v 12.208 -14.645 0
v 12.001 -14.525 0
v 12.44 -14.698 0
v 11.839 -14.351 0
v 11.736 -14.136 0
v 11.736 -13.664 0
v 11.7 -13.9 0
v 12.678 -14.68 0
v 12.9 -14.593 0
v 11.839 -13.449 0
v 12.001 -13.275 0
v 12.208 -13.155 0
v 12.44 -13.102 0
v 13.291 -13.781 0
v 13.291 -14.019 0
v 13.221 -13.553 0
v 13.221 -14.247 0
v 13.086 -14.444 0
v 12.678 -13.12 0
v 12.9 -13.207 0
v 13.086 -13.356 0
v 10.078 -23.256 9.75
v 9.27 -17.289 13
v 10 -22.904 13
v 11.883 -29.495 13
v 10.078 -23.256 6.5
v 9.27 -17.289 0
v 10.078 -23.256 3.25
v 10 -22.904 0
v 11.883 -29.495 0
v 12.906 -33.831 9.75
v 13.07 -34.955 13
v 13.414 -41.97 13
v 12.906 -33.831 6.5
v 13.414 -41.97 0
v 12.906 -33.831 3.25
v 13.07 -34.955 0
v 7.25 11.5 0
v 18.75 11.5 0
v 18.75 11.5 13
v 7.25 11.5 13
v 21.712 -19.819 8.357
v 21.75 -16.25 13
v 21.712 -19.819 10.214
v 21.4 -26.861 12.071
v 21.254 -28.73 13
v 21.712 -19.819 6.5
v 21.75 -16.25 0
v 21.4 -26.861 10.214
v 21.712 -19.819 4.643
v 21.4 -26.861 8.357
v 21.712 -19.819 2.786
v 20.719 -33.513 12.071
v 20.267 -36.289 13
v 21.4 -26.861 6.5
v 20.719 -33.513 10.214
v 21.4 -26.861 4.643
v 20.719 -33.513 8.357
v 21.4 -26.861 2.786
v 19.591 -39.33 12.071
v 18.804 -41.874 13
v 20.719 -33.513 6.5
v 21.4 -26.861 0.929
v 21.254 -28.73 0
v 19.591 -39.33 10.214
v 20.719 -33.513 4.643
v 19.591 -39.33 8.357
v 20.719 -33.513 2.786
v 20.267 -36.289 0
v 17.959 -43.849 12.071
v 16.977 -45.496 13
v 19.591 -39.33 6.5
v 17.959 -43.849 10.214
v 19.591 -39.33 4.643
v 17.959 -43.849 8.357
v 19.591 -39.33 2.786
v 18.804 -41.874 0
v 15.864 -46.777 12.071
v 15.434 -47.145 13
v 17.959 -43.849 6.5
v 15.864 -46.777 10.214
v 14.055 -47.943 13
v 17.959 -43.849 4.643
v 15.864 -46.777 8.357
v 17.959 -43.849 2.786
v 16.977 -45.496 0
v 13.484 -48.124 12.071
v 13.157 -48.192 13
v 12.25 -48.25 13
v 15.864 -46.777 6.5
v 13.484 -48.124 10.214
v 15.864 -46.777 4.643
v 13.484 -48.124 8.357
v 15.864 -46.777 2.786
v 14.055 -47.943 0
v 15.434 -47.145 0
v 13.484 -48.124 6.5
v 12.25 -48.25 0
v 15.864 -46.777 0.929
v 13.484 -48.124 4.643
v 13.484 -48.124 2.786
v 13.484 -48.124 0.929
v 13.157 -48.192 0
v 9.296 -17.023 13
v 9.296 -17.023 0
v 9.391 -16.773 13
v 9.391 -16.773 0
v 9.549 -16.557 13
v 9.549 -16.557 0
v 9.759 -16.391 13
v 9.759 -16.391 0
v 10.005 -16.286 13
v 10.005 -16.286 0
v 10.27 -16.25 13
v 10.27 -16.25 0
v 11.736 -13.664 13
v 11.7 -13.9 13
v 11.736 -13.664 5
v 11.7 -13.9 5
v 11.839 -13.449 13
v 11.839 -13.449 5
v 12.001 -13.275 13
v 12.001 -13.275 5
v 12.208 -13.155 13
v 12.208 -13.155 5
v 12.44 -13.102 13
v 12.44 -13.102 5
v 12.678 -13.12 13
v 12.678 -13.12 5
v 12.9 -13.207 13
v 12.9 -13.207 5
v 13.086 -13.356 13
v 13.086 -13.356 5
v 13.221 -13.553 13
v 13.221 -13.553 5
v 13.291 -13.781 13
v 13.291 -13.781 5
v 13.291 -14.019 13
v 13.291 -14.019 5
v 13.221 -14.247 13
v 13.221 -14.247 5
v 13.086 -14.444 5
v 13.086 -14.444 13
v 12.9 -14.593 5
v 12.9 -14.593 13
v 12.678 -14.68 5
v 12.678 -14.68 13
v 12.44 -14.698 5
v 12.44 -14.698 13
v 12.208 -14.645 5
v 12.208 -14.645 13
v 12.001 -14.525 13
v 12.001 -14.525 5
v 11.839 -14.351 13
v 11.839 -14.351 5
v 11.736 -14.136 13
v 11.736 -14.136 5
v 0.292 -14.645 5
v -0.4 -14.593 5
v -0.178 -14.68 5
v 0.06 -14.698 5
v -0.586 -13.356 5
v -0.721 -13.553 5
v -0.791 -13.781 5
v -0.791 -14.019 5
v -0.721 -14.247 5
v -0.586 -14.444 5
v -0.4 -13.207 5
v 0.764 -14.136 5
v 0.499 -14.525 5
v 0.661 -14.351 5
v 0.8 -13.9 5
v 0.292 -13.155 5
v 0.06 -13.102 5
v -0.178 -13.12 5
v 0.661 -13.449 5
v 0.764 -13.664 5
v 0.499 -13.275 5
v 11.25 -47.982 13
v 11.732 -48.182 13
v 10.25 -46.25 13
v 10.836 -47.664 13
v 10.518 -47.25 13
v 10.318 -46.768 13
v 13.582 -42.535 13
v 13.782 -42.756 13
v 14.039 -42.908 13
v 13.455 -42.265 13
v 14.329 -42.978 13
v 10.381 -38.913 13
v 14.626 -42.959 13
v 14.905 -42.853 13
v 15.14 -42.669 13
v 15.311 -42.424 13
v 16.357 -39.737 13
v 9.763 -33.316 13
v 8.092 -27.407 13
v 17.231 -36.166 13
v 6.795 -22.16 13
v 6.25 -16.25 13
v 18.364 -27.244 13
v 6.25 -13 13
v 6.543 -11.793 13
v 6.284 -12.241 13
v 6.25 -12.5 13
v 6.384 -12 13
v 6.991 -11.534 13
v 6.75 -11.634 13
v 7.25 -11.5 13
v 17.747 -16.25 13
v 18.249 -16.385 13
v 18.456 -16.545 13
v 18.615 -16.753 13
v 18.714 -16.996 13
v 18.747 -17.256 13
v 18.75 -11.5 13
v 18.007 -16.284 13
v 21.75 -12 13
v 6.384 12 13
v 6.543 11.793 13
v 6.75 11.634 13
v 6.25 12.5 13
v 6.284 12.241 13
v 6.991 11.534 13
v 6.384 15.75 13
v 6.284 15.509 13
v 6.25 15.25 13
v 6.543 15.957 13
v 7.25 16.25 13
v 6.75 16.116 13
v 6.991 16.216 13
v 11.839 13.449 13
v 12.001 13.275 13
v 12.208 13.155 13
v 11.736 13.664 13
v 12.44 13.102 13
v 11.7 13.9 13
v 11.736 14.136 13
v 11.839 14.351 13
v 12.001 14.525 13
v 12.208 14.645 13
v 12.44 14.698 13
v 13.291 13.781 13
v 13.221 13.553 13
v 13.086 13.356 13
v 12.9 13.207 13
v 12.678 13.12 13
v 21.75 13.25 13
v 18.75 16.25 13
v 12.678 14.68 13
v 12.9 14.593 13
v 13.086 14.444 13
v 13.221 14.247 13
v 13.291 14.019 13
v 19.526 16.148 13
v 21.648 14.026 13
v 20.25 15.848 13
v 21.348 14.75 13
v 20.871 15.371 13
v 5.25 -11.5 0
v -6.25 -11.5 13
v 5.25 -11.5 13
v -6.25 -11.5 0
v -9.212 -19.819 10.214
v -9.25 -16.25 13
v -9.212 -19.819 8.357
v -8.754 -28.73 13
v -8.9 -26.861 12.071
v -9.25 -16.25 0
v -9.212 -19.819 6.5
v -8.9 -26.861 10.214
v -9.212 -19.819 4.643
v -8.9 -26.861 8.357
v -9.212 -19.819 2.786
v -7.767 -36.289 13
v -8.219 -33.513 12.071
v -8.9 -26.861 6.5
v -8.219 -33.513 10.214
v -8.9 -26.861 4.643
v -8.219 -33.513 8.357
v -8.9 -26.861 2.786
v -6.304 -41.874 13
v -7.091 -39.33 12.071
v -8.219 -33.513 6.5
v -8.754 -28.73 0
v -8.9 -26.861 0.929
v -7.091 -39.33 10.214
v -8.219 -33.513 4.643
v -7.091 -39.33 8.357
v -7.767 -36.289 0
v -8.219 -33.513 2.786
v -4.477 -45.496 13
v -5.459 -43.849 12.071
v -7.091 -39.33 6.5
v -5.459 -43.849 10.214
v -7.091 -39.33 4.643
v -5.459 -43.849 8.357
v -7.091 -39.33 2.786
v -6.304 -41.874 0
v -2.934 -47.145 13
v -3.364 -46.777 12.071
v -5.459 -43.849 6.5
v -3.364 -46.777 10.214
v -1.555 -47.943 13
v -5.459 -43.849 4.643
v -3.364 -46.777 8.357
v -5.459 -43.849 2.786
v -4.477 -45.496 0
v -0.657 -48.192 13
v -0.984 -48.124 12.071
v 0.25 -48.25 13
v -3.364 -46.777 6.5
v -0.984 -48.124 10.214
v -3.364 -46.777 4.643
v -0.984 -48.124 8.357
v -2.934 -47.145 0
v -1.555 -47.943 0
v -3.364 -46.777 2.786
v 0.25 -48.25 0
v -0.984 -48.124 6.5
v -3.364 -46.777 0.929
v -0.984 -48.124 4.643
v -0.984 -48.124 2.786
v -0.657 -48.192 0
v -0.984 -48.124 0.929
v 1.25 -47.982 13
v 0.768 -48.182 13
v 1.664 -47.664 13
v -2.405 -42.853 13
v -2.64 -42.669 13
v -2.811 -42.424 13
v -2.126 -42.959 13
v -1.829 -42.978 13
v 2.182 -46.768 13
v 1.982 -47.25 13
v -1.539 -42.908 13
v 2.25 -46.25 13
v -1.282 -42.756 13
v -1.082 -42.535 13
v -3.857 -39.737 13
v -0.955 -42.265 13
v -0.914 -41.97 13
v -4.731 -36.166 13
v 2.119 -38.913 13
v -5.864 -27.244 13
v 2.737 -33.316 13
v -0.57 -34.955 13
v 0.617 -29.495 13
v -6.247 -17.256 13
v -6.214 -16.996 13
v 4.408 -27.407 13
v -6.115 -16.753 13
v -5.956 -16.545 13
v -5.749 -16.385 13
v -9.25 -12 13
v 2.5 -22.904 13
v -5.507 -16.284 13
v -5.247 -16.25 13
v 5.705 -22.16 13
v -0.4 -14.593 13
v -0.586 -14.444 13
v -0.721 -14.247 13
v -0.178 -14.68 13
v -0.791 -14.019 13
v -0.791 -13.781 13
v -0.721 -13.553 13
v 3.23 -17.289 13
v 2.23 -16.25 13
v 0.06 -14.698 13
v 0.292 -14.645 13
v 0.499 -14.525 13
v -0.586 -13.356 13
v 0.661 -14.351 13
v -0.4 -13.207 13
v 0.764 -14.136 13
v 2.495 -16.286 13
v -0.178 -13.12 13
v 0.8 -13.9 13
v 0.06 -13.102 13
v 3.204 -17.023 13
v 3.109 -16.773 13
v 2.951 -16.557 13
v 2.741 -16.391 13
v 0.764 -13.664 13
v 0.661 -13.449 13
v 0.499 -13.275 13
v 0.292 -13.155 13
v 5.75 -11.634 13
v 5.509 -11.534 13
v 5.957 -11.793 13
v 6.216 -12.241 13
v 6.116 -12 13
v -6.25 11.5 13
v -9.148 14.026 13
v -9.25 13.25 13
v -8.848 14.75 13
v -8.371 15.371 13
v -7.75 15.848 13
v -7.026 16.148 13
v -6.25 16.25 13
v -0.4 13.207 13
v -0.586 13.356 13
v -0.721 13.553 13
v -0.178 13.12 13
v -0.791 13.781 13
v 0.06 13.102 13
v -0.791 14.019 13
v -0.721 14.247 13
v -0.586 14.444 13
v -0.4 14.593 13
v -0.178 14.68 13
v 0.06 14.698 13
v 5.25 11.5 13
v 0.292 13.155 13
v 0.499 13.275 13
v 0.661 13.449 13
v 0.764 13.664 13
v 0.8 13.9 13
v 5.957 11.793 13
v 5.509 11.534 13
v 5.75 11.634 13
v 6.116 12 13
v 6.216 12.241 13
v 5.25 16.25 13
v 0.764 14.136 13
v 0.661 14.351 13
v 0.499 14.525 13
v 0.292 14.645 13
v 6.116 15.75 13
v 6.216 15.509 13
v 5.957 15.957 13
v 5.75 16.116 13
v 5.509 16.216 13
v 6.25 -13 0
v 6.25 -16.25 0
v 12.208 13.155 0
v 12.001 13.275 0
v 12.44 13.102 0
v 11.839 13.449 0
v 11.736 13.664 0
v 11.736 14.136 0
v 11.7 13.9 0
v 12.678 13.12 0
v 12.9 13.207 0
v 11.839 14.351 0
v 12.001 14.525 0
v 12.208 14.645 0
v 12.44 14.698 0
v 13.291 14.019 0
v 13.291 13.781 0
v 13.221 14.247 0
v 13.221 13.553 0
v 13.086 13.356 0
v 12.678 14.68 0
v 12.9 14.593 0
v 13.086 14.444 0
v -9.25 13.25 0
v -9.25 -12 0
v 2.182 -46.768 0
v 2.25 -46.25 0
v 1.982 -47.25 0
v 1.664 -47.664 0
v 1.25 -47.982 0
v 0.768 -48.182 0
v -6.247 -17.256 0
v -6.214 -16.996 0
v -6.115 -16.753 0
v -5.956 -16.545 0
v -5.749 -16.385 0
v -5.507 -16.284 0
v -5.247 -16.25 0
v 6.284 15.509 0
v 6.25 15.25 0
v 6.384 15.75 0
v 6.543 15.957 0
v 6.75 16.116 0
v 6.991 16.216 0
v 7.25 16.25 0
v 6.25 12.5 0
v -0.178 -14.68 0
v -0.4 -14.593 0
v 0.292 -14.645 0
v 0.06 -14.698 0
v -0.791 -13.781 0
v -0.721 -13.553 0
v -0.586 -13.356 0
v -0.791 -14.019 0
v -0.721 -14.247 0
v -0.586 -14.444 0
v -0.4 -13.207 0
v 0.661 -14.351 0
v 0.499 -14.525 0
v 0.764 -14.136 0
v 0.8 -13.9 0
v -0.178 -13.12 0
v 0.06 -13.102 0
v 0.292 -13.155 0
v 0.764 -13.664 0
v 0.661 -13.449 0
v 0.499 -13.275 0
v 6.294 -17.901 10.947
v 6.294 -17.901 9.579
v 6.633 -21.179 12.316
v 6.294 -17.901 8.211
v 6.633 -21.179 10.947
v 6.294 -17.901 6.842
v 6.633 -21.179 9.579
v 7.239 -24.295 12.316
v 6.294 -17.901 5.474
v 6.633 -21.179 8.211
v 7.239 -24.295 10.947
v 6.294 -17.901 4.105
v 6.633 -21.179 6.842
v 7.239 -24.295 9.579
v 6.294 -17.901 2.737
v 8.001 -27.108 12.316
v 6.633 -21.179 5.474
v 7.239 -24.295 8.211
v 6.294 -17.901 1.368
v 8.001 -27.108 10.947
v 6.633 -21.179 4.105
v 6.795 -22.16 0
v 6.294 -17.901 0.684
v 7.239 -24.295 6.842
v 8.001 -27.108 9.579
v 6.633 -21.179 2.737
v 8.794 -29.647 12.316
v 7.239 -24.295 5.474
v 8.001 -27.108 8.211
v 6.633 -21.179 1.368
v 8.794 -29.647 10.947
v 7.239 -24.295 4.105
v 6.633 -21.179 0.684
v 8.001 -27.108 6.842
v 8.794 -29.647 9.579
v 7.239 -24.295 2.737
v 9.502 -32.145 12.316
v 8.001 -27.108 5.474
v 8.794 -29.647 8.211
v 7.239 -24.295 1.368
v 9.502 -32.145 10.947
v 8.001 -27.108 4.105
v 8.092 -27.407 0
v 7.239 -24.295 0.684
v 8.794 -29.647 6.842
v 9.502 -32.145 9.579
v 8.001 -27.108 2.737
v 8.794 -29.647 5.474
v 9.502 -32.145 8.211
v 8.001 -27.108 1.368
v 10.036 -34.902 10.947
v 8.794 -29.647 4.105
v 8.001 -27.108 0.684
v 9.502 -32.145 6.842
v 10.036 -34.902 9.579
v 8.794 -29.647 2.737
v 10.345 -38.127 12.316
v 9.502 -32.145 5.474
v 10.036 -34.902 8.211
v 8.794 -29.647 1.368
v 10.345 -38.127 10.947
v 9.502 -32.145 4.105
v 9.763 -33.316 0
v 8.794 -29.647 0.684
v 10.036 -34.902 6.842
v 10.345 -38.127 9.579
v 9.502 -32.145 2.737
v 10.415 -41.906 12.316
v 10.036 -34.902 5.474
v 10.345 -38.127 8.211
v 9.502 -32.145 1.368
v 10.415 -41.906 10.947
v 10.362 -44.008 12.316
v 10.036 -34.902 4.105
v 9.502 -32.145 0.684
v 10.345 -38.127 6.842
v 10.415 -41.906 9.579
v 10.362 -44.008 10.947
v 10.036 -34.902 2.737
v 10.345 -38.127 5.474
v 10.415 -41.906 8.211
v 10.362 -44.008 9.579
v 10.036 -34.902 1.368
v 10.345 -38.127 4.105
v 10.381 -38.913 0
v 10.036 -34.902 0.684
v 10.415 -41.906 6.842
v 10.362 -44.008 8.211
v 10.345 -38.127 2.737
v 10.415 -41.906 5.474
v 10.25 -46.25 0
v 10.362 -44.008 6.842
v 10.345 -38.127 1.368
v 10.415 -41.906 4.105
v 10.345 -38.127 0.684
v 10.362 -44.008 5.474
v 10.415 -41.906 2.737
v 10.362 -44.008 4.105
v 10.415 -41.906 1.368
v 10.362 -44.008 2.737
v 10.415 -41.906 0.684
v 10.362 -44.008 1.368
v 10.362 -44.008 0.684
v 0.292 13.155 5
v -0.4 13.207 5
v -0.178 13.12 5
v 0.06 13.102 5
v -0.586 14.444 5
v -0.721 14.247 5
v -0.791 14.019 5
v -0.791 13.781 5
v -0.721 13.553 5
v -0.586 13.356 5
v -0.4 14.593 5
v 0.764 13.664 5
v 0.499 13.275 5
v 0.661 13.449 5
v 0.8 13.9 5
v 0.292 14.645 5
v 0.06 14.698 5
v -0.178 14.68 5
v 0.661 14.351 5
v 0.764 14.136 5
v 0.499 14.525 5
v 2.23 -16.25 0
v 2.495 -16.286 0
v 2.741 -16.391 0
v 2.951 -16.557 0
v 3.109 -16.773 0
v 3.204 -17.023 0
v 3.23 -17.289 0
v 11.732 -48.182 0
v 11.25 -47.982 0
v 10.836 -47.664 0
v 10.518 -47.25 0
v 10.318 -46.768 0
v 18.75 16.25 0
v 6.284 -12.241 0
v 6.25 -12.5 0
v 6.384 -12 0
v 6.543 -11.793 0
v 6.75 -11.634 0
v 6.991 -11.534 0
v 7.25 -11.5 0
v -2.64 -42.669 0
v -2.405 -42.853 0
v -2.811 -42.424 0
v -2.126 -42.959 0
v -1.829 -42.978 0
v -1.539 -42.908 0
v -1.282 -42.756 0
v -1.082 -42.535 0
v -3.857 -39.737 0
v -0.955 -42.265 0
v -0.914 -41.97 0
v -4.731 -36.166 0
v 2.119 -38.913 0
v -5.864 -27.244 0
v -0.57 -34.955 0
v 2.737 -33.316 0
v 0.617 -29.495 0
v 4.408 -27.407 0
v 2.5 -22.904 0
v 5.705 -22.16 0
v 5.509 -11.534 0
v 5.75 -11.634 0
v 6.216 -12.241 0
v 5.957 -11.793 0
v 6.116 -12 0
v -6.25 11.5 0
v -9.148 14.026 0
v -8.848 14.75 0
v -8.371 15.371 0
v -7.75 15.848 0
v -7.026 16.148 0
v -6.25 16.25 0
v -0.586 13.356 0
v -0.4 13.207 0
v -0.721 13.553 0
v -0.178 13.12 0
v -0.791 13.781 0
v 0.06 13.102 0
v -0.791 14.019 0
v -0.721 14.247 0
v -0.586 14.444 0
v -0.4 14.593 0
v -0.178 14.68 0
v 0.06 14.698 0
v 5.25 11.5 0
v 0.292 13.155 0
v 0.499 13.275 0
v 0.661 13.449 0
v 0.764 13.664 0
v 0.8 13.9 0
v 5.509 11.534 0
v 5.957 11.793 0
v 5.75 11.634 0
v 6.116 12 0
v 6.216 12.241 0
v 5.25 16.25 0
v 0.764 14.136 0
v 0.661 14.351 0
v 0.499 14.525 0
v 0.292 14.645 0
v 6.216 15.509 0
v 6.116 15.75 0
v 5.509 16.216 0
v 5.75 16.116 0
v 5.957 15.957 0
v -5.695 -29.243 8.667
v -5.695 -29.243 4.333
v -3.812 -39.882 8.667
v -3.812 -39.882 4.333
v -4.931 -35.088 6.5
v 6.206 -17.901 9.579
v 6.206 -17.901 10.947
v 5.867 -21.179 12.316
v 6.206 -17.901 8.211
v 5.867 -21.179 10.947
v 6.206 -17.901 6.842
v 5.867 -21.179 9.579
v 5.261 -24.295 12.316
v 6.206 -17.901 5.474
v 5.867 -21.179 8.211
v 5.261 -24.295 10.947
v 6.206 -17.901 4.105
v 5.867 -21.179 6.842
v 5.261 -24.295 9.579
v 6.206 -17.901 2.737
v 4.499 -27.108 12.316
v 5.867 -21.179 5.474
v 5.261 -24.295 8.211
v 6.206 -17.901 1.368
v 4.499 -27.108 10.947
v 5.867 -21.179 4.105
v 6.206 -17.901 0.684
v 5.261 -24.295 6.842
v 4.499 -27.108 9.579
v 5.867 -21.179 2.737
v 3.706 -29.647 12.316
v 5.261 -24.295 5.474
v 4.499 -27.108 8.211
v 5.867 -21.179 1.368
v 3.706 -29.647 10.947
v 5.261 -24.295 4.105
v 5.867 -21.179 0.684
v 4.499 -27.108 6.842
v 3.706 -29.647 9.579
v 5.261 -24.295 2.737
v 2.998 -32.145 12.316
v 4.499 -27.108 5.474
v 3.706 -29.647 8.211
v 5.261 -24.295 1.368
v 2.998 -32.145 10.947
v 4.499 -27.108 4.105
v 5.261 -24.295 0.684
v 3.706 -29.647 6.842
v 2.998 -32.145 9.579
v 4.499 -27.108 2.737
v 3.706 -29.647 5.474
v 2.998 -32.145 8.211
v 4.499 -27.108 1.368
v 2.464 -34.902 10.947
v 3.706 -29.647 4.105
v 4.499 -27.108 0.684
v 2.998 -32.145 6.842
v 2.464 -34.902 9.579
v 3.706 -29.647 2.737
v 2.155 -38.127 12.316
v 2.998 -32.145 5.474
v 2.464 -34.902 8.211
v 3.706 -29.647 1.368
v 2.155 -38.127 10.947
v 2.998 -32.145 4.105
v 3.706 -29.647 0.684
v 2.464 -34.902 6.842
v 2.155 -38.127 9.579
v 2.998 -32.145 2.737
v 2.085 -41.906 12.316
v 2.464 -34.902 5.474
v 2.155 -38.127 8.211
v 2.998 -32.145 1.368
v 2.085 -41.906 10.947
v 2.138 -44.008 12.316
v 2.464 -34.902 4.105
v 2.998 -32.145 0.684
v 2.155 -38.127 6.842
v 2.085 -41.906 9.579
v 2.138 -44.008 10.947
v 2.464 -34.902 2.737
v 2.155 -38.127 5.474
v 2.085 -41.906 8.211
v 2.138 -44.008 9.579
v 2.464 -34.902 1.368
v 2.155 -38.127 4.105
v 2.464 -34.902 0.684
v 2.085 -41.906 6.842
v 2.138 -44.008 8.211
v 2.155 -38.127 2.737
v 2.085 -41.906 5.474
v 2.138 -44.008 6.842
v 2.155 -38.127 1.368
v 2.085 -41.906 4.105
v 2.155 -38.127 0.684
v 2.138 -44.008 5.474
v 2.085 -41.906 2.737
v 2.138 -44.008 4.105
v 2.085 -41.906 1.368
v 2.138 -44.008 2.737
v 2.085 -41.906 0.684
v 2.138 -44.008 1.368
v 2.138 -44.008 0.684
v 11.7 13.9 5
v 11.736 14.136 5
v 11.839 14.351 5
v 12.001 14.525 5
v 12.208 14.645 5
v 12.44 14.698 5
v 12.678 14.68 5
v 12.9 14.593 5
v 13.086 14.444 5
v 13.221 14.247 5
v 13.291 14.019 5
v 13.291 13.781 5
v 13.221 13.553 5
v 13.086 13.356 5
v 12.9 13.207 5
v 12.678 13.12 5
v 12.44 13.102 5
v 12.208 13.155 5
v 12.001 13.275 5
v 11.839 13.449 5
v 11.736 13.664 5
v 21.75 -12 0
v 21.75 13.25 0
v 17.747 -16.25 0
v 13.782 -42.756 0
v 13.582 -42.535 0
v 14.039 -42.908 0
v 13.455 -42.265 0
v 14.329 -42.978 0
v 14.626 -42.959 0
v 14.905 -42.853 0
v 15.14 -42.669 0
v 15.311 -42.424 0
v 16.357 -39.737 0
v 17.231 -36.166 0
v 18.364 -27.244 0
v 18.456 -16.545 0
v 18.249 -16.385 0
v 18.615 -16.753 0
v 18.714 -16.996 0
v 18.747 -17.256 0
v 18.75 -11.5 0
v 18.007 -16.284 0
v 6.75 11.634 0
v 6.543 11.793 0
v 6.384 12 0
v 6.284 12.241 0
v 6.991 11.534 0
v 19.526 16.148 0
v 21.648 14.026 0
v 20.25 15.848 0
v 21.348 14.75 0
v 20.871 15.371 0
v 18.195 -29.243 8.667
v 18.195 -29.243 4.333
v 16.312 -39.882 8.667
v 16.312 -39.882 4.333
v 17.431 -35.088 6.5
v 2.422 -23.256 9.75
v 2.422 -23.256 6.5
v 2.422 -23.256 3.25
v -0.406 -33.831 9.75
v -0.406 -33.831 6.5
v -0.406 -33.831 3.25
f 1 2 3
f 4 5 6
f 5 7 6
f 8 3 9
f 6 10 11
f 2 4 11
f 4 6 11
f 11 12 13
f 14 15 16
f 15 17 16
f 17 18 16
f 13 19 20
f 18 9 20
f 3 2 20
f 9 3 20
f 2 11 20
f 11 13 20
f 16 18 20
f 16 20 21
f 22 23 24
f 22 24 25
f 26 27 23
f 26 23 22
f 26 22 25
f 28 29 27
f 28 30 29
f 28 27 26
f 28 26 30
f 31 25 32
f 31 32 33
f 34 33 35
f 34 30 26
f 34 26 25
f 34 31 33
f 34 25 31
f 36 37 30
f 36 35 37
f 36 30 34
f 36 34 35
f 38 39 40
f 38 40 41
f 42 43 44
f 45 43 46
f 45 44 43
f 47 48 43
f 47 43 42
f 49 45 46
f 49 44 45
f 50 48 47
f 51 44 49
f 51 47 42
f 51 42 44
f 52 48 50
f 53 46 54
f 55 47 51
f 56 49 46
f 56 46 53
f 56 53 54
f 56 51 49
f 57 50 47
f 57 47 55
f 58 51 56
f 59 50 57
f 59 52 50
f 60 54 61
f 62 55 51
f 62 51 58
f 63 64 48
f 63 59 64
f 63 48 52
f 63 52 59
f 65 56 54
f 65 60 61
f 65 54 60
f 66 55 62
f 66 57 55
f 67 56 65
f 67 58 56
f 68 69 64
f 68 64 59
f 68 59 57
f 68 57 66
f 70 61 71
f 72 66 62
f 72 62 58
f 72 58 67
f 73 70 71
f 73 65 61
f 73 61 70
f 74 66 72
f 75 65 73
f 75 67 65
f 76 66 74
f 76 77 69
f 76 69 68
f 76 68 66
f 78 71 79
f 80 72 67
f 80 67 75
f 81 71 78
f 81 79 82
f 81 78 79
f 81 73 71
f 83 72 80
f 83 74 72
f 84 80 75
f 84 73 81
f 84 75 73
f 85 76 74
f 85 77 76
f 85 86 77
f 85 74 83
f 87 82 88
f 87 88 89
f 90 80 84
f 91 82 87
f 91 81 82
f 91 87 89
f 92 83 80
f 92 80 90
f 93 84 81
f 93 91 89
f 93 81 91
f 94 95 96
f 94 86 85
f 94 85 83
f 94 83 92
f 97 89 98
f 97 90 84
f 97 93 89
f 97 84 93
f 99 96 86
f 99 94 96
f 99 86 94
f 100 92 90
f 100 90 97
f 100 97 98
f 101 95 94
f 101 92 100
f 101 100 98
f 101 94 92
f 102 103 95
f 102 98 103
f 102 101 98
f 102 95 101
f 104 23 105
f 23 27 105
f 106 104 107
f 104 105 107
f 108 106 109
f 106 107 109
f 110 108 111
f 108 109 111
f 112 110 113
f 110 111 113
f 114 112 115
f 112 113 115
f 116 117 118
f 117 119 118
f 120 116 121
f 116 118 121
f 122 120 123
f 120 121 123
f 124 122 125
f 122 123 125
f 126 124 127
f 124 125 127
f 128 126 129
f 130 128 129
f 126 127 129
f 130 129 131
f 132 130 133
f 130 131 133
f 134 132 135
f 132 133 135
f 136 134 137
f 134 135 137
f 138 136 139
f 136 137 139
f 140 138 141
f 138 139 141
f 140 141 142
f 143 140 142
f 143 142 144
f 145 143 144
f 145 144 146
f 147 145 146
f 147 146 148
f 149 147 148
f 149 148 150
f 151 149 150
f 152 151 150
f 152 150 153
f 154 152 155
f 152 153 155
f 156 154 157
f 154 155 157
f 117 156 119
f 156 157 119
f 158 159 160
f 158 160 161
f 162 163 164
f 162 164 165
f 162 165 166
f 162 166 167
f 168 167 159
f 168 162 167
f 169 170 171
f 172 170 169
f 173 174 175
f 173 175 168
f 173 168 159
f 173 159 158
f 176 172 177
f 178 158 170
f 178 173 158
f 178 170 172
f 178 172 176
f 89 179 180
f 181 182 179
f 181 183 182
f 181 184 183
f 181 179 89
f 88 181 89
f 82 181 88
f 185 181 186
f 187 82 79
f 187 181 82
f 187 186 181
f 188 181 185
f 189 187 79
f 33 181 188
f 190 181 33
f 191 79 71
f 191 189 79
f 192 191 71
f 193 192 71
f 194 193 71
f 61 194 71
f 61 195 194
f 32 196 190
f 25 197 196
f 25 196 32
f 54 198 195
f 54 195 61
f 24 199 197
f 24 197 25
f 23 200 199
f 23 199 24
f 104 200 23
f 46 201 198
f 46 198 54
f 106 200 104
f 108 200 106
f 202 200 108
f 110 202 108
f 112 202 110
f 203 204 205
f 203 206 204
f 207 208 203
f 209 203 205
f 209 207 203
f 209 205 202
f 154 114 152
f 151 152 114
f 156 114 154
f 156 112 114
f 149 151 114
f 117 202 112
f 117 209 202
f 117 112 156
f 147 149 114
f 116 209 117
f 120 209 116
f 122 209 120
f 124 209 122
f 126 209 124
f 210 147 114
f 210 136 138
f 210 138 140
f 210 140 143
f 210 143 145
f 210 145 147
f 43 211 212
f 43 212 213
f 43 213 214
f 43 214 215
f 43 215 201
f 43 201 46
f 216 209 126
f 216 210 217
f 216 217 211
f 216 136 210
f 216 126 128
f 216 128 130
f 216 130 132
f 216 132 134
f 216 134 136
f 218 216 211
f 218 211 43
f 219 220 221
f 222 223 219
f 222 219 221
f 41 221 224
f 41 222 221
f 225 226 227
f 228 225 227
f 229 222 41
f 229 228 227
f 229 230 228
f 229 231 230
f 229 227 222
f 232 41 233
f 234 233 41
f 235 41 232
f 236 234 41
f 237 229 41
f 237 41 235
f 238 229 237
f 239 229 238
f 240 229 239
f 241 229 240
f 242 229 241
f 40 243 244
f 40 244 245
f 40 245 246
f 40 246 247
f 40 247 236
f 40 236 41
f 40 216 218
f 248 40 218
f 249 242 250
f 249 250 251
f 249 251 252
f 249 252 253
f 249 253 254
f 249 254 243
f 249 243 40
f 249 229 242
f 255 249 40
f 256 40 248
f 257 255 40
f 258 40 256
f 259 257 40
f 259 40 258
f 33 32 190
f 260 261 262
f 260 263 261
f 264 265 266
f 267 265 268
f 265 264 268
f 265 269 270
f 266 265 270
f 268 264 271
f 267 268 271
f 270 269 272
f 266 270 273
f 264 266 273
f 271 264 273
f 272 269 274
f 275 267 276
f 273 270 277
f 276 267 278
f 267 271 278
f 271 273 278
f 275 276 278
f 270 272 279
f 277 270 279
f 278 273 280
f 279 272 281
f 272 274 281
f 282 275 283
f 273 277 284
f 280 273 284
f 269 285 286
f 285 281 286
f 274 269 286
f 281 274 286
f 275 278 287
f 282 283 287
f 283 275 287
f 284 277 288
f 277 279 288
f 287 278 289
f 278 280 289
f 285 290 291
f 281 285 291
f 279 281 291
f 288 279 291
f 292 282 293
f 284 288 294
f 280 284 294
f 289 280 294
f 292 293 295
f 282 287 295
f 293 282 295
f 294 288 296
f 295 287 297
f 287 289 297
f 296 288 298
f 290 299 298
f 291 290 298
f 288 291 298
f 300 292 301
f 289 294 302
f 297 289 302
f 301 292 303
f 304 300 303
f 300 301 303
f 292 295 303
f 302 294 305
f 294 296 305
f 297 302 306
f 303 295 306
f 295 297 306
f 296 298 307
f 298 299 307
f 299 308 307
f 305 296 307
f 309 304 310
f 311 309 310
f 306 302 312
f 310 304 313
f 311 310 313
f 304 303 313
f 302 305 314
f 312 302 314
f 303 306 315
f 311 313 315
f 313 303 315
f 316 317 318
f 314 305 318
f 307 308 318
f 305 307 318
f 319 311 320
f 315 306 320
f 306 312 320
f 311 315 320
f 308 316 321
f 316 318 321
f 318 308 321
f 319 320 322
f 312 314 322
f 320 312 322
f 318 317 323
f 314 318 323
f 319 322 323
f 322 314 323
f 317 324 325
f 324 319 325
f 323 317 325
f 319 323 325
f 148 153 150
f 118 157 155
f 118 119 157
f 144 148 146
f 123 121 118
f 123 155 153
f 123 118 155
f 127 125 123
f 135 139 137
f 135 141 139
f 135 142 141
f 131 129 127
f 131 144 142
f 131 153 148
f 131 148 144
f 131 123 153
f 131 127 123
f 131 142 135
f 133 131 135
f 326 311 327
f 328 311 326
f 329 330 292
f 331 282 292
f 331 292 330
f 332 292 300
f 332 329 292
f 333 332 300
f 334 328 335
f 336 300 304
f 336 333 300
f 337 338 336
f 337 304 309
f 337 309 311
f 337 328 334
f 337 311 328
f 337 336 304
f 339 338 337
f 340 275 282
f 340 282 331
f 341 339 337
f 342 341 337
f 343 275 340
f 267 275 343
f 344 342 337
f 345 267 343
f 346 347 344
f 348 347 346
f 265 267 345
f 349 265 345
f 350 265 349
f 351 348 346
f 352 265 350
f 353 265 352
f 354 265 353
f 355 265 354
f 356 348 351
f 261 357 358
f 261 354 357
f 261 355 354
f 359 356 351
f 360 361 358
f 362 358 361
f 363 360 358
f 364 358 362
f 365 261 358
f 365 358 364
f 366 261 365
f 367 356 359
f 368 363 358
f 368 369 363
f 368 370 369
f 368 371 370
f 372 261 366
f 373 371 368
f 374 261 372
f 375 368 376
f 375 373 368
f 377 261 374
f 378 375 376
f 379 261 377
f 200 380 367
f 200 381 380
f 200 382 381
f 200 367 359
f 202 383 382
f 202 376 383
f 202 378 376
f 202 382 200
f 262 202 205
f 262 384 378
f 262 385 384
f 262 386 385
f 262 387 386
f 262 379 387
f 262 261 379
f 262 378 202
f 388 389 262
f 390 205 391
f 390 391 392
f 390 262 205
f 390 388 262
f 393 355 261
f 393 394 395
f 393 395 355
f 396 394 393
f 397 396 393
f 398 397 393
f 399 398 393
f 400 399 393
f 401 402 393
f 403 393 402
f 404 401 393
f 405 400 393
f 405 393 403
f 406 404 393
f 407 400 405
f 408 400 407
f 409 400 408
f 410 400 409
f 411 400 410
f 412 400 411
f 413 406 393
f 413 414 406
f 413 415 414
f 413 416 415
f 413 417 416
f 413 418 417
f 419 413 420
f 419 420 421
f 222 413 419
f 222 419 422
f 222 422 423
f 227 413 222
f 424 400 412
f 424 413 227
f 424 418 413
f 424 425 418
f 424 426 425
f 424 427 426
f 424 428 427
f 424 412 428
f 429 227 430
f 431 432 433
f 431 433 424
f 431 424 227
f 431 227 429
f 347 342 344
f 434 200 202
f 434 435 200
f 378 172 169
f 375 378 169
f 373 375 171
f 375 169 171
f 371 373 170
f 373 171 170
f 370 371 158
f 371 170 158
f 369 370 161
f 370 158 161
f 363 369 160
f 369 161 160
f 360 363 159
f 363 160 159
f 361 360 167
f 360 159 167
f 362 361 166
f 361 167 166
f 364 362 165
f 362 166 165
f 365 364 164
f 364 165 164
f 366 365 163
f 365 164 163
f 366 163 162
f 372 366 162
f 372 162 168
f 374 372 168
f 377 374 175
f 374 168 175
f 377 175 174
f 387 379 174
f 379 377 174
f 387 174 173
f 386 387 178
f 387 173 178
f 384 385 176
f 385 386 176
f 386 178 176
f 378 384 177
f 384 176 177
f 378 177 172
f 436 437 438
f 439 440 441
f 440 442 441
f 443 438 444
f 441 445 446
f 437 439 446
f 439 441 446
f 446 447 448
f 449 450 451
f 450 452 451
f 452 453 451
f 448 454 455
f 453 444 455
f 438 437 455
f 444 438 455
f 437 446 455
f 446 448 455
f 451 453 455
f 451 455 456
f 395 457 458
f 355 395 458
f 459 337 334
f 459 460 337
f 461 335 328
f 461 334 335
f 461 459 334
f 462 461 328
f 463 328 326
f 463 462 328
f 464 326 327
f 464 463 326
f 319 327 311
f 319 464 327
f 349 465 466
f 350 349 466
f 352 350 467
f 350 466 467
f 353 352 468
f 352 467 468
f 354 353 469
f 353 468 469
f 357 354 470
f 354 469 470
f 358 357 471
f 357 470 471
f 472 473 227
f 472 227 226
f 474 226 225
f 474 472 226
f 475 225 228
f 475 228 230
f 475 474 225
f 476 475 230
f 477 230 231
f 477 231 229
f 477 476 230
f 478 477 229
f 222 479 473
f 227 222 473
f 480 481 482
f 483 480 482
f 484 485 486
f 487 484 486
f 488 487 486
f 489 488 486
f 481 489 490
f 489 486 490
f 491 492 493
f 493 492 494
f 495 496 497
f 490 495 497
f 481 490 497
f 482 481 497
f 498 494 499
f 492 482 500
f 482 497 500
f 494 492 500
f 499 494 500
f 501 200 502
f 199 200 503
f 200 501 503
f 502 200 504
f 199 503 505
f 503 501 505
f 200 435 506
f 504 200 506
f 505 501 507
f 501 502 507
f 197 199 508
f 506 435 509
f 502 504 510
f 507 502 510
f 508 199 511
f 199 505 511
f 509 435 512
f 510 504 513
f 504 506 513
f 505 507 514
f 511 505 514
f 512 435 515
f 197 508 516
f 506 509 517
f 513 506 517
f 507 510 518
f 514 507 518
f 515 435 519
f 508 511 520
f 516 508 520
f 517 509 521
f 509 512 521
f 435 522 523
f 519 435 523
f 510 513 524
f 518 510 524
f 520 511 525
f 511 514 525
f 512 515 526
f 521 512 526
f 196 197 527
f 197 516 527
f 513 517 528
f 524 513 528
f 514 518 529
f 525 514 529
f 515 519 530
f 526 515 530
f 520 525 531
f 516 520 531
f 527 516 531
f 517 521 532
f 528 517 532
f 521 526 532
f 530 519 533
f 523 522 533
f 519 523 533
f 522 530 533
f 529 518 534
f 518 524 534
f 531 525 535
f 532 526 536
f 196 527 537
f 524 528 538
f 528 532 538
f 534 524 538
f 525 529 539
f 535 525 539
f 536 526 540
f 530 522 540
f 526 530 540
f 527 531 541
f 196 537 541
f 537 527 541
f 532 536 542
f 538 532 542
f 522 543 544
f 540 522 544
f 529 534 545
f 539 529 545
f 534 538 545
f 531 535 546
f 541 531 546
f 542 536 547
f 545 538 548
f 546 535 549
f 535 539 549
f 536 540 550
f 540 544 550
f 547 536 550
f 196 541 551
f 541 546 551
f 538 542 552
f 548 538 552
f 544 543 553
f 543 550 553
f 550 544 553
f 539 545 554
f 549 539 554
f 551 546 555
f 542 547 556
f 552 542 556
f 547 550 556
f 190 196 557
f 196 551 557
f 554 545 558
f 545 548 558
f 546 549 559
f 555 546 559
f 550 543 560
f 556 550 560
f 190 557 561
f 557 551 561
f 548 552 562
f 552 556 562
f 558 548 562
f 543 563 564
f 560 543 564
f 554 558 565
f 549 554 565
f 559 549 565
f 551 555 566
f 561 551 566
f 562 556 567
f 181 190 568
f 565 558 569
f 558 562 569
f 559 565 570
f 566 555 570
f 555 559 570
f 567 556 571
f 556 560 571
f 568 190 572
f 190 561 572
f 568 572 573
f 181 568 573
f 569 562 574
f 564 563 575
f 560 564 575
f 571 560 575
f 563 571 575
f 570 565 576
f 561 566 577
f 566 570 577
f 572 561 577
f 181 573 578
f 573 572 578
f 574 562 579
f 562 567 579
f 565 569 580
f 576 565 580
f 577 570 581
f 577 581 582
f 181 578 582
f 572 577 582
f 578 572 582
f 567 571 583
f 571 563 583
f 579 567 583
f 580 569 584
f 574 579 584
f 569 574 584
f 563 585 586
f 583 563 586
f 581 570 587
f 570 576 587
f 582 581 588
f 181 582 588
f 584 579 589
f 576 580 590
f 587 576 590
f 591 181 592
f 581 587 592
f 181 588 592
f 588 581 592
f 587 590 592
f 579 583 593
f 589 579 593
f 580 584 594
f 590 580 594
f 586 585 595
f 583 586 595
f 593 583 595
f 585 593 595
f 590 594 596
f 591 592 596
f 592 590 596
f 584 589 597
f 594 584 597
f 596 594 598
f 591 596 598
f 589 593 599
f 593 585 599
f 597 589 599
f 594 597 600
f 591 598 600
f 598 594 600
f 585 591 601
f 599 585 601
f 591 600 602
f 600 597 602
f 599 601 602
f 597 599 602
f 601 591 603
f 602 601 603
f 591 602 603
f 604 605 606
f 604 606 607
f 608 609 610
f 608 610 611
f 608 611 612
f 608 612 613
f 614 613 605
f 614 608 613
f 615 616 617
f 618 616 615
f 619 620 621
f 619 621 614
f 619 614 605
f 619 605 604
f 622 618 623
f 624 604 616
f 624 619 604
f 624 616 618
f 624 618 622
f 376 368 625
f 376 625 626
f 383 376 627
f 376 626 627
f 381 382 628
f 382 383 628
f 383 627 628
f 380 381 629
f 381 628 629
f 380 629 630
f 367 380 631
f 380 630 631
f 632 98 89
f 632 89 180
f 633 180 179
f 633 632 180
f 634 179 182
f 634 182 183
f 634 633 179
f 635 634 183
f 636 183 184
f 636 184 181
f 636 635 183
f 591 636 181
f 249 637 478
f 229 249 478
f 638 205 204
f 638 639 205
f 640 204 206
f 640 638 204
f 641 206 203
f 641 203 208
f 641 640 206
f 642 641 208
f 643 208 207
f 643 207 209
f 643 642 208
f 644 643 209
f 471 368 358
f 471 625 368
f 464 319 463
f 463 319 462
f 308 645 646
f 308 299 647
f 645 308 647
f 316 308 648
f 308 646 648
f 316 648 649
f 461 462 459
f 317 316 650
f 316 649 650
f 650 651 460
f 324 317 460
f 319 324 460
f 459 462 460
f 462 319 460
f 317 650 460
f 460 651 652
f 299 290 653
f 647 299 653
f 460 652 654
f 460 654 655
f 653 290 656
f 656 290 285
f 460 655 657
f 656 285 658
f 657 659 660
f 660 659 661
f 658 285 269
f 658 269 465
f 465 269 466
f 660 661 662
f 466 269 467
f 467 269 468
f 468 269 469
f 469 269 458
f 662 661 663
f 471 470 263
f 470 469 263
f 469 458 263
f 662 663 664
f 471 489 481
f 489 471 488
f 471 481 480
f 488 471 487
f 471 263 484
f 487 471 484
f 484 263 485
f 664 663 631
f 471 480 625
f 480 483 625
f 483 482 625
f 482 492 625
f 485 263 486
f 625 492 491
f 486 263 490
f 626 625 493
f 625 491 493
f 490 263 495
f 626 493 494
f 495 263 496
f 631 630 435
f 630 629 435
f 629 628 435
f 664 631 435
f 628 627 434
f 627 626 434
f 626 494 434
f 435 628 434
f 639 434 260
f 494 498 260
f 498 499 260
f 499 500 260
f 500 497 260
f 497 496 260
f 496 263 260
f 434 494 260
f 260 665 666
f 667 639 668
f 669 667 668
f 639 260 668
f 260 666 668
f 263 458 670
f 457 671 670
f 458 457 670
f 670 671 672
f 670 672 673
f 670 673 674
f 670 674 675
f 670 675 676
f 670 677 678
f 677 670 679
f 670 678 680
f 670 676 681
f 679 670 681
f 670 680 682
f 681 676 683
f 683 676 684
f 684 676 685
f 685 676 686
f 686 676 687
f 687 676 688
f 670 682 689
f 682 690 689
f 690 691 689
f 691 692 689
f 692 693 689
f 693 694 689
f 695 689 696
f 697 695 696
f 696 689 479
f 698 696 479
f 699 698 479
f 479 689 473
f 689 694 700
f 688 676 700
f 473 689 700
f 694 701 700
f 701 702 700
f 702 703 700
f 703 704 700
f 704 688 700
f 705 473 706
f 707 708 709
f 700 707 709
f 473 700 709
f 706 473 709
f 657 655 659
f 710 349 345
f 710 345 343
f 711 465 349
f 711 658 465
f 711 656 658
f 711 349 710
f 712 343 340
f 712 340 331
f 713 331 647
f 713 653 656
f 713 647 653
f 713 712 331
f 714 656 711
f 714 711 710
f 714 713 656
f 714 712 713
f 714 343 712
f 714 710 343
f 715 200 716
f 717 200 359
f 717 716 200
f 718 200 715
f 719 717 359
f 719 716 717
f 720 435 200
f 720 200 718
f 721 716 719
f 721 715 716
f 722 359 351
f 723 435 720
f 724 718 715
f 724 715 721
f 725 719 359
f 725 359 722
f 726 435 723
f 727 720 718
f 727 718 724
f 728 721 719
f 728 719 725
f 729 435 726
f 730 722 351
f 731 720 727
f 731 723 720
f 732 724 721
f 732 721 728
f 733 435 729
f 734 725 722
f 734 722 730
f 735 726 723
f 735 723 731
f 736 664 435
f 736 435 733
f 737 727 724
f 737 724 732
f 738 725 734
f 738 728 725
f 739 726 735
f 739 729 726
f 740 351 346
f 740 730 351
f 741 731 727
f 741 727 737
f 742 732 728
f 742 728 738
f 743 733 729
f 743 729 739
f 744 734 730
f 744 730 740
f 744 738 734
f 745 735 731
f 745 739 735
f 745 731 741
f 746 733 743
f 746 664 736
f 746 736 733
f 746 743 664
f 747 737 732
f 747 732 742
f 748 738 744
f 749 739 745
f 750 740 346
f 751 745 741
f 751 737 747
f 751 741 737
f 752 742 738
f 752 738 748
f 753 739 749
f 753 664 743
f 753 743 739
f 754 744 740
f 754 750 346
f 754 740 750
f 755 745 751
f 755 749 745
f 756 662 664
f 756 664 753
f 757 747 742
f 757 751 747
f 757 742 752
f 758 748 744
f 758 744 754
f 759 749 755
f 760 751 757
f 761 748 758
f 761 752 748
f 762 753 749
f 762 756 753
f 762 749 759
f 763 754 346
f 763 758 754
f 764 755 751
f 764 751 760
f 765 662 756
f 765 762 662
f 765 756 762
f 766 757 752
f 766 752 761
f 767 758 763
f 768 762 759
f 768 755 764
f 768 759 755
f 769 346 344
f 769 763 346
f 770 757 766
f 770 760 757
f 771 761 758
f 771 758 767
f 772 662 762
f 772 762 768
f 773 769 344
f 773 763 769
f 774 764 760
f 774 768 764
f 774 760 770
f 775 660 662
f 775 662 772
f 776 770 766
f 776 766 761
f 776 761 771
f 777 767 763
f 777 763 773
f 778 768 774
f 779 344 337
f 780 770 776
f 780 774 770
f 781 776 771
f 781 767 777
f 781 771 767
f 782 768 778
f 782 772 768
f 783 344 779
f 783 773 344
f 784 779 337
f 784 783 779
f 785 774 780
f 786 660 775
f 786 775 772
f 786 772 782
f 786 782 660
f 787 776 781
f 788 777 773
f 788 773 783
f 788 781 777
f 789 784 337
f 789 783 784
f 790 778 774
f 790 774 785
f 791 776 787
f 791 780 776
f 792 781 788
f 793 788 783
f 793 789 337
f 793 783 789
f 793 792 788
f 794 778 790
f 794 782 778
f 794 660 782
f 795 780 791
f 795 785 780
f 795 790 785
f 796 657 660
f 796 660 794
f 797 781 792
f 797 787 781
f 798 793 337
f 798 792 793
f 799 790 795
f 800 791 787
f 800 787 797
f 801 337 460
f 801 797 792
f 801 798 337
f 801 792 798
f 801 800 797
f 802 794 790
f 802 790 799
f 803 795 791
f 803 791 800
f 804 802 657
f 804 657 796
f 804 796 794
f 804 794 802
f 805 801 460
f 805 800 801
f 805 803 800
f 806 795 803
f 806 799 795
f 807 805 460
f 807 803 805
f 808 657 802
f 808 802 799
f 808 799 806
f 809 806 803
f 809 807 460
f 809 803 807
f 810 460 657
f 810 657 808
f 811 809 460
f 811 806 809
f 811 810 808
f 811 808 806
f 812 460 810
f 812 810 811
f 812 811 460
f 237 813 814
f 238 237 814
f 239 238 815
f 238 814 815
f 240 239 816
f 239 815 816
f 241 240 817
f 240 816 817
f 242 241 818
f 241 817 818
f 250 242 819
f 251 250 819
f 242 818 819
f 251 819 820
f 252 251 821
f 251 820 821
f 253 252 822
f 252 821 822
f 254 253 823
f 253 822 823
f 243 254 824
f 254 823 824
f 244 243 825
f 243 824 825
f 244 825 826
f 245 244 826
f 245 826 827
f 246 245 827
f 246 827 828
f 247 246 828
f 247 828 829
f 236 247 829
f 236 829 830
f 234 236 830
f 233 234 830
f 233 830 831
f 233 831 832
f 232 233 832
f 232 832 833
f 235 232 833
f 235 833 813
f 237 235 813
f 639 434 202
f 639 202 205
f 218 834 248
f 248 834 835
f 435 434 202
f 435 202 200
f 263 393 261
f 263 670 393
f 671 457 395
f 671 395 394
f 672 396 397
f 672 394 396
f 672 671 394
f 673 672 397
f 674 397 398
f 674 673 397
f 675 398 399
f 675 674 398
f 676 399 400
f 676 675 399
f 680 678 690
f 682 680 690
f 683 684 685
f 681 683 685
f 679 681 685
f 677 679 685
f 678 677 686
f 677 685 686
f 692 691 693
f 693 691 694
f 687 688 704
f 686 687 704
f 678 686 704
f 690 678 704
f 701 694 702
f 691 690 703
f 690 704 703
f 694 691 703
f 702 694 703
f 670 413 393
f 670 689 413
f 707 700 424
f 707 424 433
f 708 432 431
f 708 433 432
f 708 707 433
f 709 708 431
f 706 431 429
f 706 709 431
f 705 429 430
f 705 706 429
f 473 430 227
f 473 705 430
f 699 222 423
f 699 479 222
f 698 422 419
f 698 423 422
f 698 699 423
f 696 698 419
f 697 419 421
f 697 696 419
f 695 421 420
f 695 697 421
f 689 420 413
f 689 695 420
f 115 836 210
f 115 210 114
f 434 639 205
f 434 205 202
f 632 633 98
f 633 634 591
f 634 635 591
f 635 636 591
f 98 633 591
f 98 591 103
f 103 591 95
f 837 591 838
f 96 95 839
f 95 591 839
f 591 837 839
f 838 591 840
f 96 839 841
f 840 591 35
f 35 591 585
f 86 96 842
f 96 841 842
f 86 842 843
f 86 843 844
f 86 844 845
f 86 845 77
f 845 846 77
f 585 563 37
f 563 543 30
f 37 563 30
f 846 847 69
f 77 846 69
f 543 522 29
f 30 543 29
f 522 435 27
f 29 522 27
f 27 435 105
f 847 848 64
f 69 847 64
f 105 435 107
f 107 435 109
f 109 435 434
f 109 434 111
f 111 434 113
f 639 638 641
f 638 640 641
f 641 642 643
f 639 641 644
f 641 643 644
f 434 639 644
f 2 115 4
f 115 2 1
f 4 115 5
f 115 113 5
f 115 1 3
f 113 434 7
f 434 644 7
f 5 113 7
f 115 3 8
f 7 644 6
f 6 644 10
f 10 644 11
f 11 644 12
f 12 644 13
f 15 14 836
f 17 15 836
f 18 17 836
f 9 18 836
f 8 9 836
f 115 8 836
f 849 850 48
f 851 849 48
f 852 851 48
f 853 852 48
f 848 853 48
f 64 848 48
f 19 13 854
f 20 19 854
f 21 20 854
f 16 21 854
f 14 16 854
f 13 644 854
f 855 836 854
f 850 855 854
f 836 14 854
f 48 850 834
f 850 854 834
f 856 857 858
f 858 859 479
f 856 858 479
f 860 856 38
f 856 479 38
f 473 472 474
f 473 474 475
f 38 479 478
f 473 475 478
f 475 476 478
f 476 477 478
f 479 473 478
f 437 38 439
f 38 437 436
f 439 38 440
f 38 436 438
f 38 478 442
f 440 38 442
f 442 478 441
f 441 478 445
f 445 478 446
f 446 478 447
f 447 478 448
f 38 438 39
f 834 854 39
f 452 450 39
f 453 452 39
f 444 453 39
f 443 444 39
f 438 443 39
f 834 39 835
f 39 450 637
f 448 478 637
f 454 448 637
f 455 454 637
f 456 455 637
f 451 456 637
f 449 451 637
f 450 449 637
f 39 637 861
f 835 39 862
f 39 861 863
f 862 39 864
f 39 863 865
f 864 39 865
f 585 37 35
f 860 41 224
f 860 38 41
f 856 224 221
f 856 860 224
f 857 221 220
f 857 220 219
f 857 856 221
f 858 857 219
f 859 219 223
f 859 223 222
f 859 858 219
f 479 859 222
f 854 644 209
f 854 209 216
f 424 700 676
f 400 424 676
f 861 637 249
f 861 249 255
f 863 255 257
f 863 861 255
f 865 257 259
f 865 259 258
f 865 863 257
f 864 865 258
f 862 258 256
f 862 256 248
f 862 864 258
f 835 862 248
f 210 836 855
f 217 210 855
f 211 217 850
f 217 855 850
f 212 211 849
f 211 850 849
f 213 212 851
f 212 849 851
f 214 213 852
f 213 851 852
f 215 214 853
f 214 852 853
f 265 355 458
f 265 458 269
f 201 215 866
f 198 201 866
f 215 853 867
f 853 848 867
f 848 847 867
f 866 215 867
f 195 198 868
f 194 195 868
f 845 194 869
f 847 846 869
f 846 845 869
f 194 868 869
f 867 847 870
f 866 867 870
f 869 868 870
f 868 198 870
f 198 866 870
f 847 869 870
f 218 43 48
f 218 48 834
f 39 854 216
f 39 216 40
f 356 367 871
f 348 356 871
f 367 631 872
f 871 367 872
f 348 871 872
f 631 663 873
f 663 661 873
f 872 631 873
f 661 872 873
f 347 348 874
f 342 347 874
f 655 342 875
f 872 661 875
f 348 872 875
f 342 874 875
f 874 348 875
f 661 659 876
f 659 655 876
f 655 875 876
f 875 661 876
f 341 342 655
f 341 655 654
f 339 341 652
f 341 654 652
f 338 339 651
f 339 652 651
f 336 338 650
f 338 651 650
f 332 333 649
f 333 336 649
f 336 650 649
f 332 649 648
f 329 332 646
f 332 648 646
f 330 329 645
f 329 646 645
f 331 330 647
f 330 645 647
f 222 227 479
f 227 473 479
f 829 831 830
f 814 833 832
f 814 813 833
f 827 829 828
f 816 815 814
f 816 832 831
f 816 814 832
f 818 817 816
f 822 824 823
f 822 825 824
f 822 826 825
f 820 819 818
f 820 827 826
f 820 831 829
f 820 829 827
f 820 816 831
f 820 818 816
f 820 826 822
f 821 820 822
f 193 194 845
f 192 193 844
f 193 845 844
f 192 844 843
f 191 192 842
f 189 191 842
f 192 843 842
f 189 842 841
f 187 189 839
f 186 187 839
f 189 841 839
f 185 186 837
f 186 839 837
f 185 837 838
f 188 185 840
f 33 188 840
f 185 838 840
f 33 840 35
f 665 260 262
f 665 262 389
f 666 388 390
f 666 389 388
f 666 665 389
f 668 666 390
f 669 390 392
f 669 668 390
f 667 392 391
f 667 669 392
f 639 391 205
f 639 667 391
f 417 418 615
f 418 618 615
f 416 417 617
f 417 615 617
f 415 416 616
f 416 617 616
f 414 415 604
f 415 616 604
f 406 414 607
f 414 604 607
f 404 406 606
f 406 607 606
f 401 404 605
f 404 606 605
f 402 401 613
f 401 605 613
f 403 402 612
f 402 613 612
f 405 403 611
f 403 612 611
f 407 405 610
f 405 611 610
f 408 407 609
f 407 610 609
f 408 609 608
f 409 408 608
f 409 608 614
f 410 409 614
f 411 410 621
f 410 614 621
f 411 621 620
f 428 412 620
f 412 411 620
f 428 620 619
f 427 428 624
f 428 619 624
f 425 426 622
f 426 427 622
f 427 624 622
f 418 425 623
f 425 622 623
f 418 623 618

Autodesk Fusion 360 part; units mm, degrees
sketch "Sketch1" plane through (0, 0, 0) normal (0, 0, 1) x (1, 0, 0)
  line L0 (5.25, 11.5) -> (-6.25, 11.5)
  line L1 (-6.25, 11.5) -> (-6.25, -11.5)
  line L2 (-6.25, -11.5) -> (5.25, -11.5)
  line L3 (-9.25, 13.25) -> (-9.25, -16.25)
  line L4 (6.25, 12.5) -> (6.25, 15.25)
  line L5 (6.25, -12.5) -> (6.25, -16.25)
  line L6 (5.25, 16.25) -> (-6.25, 16.25)
  circle A0 centre (0, 13.9) radius 0.8
  circle A1 centre (0, -13.9) radius 0.8
  spline S0 degree 5 poles (6.25, -16.25) (6.25, -16.6676) (6.2357, -17.5036) (6.1715, -18.7605) (6.0031, -20.434) (5.6739, -22.4784) (5.2523, -24.4268) (4.7694, -26.2419) (4.2577, -27.9159) (3.7493, -29.4897) (3.2734, -31.0346) (2.8556, -32.634) (2.516, -34.367) (2.2668, -36.2872) (2.1131, -38.4227) (2.0561, -40.7853) (2.087, -42.8585) (2.1522, -44.515) (2.2143, -45.6642) (2.25, -46.25) knots 0 0 0 0 0 0 0.066667 0.133333 0.2 0.266667 0.333333 0.4 0.466667 0.533333 0.6 0.666667 0.733333 0.8 0.866667 0.933333 1 1 1 1 1 1
  arc A2 (0.25, -48.25) -> (2.25, -46.25) centre (0.25, -46.25) ccw
  spline S1 degree 5 poles (-9.25, -16.25) (-9.25, -17.2508) (-9.2353, -19.2506) (-9.1693, -22.2447) (-8.9897, -26.2076) (-8.5912, -31.003) (-7.9895, -35.4883) (-7.1545, -39.4912) (-6.0655, -42.8464) (-4.722, -45.4219) (-3.1673, -47.1742) (-1.8215, -47.9565) (-0.7899, -48.2233) (-0.0974, -48.264) (0.25, -48.25) knots 0 0 0 0 0 0 0.1 0.2 0.3 0.4 0.5 0.6 0.7 0.8 0.9 1 1 1 1 1 1
  line L7 (6.25, -13) -> (6.25, -19.5)
  line L8 (-9.25, -12) -> (-9.25, -20.5)
  line L9 (-2.6364, -48.3662) -> (3.1364, -48.1338)
  spline S2 degree 3 poles (-6.2471, -17.2558) (-6.2233, -21.3469) (-6.0529, -25.437) (-5.6953, -29.2432) (-5.3067, -33.3791) (-4.6726, -37.1464) (-3.8118, -39.8822) (-3.4994, -40.8752) (-3.1573, -41.7234) (-2.8107, -42.4245) knots 0.020453 0.020453 0.020453 0.020453 0.27 0.27 0.27 0.541159 0.541159 0.541159 0.639581 0.639581 0.639581 0.639581
  spline S3 degree 3 poles (3.2295, -17.2889) (3.1506, -19.3134) (2.85, -21.3675) (2.4217, -23.2564) (2.0271, -24.9967) (1.5393, -26.5428) (1.0455, -28.106) (0.5017, -29.8277) (-0.0499, -31.6576) (-0.4062, -33.8312) (-0.7884, -36.1626) (-0.9513, -38.8586) (-0.9144, -41.9695) knots 0.036628 0.036628 0.036628 0.036628 0.25 0.25 0.25 0.446598 0.446598 0.446598 0.663121 0.663121 0.663121 0.895358 0.895358 0.895358 0.895358
  line L10 (2.2302, -16.25) -> (-5.2471, -16.25)
  arc A3 (-6.25, 16.25) -> (-9.25, 13.25) centre (-6.25, 13.25) ccw
  arc A4 (6.25, 15.25) -> (5.25, 16.25) centre (5.25, 15.25) ccw
  arc A5 (5.25, 11.5) -> (6.25, 12.5) centre (5.25, 12.5) ccw
  arc A6 (6.25, -12.5) -> (5.25, -11.5) centre (5.25, -12.5) ccw
  arc A7 (-2.8107, -42.4245) -> (-0.9144, -41.9695) centre (-1.9143, -41.9814) ccw
  arc A8 (-5.2471, -16.25) -> (-6.2471, -17.2558) centre (-5.2471, -17.25) ccw
  arc A9 (3.2295, -17.2889) -> (2.2302, -16.25) centre (2.2302, -17.25) ccw
  point P0 (4.75, -26.25)
  point P1 (2.75, -33.25)
  point P2 (-5.25, -44.25)
extrude "Extrude1" add sketch "Sketch1" along normal blind 13 makes body 1
extrude "Extrude3" add sketch "Sketch1" along normal blind 5 contours A0 | A1 bodies 1
mirror "Mirror1" about plane through (6.25, 12.5, 0) normal (1, 0, 0) of bodies 1 makes body 2
